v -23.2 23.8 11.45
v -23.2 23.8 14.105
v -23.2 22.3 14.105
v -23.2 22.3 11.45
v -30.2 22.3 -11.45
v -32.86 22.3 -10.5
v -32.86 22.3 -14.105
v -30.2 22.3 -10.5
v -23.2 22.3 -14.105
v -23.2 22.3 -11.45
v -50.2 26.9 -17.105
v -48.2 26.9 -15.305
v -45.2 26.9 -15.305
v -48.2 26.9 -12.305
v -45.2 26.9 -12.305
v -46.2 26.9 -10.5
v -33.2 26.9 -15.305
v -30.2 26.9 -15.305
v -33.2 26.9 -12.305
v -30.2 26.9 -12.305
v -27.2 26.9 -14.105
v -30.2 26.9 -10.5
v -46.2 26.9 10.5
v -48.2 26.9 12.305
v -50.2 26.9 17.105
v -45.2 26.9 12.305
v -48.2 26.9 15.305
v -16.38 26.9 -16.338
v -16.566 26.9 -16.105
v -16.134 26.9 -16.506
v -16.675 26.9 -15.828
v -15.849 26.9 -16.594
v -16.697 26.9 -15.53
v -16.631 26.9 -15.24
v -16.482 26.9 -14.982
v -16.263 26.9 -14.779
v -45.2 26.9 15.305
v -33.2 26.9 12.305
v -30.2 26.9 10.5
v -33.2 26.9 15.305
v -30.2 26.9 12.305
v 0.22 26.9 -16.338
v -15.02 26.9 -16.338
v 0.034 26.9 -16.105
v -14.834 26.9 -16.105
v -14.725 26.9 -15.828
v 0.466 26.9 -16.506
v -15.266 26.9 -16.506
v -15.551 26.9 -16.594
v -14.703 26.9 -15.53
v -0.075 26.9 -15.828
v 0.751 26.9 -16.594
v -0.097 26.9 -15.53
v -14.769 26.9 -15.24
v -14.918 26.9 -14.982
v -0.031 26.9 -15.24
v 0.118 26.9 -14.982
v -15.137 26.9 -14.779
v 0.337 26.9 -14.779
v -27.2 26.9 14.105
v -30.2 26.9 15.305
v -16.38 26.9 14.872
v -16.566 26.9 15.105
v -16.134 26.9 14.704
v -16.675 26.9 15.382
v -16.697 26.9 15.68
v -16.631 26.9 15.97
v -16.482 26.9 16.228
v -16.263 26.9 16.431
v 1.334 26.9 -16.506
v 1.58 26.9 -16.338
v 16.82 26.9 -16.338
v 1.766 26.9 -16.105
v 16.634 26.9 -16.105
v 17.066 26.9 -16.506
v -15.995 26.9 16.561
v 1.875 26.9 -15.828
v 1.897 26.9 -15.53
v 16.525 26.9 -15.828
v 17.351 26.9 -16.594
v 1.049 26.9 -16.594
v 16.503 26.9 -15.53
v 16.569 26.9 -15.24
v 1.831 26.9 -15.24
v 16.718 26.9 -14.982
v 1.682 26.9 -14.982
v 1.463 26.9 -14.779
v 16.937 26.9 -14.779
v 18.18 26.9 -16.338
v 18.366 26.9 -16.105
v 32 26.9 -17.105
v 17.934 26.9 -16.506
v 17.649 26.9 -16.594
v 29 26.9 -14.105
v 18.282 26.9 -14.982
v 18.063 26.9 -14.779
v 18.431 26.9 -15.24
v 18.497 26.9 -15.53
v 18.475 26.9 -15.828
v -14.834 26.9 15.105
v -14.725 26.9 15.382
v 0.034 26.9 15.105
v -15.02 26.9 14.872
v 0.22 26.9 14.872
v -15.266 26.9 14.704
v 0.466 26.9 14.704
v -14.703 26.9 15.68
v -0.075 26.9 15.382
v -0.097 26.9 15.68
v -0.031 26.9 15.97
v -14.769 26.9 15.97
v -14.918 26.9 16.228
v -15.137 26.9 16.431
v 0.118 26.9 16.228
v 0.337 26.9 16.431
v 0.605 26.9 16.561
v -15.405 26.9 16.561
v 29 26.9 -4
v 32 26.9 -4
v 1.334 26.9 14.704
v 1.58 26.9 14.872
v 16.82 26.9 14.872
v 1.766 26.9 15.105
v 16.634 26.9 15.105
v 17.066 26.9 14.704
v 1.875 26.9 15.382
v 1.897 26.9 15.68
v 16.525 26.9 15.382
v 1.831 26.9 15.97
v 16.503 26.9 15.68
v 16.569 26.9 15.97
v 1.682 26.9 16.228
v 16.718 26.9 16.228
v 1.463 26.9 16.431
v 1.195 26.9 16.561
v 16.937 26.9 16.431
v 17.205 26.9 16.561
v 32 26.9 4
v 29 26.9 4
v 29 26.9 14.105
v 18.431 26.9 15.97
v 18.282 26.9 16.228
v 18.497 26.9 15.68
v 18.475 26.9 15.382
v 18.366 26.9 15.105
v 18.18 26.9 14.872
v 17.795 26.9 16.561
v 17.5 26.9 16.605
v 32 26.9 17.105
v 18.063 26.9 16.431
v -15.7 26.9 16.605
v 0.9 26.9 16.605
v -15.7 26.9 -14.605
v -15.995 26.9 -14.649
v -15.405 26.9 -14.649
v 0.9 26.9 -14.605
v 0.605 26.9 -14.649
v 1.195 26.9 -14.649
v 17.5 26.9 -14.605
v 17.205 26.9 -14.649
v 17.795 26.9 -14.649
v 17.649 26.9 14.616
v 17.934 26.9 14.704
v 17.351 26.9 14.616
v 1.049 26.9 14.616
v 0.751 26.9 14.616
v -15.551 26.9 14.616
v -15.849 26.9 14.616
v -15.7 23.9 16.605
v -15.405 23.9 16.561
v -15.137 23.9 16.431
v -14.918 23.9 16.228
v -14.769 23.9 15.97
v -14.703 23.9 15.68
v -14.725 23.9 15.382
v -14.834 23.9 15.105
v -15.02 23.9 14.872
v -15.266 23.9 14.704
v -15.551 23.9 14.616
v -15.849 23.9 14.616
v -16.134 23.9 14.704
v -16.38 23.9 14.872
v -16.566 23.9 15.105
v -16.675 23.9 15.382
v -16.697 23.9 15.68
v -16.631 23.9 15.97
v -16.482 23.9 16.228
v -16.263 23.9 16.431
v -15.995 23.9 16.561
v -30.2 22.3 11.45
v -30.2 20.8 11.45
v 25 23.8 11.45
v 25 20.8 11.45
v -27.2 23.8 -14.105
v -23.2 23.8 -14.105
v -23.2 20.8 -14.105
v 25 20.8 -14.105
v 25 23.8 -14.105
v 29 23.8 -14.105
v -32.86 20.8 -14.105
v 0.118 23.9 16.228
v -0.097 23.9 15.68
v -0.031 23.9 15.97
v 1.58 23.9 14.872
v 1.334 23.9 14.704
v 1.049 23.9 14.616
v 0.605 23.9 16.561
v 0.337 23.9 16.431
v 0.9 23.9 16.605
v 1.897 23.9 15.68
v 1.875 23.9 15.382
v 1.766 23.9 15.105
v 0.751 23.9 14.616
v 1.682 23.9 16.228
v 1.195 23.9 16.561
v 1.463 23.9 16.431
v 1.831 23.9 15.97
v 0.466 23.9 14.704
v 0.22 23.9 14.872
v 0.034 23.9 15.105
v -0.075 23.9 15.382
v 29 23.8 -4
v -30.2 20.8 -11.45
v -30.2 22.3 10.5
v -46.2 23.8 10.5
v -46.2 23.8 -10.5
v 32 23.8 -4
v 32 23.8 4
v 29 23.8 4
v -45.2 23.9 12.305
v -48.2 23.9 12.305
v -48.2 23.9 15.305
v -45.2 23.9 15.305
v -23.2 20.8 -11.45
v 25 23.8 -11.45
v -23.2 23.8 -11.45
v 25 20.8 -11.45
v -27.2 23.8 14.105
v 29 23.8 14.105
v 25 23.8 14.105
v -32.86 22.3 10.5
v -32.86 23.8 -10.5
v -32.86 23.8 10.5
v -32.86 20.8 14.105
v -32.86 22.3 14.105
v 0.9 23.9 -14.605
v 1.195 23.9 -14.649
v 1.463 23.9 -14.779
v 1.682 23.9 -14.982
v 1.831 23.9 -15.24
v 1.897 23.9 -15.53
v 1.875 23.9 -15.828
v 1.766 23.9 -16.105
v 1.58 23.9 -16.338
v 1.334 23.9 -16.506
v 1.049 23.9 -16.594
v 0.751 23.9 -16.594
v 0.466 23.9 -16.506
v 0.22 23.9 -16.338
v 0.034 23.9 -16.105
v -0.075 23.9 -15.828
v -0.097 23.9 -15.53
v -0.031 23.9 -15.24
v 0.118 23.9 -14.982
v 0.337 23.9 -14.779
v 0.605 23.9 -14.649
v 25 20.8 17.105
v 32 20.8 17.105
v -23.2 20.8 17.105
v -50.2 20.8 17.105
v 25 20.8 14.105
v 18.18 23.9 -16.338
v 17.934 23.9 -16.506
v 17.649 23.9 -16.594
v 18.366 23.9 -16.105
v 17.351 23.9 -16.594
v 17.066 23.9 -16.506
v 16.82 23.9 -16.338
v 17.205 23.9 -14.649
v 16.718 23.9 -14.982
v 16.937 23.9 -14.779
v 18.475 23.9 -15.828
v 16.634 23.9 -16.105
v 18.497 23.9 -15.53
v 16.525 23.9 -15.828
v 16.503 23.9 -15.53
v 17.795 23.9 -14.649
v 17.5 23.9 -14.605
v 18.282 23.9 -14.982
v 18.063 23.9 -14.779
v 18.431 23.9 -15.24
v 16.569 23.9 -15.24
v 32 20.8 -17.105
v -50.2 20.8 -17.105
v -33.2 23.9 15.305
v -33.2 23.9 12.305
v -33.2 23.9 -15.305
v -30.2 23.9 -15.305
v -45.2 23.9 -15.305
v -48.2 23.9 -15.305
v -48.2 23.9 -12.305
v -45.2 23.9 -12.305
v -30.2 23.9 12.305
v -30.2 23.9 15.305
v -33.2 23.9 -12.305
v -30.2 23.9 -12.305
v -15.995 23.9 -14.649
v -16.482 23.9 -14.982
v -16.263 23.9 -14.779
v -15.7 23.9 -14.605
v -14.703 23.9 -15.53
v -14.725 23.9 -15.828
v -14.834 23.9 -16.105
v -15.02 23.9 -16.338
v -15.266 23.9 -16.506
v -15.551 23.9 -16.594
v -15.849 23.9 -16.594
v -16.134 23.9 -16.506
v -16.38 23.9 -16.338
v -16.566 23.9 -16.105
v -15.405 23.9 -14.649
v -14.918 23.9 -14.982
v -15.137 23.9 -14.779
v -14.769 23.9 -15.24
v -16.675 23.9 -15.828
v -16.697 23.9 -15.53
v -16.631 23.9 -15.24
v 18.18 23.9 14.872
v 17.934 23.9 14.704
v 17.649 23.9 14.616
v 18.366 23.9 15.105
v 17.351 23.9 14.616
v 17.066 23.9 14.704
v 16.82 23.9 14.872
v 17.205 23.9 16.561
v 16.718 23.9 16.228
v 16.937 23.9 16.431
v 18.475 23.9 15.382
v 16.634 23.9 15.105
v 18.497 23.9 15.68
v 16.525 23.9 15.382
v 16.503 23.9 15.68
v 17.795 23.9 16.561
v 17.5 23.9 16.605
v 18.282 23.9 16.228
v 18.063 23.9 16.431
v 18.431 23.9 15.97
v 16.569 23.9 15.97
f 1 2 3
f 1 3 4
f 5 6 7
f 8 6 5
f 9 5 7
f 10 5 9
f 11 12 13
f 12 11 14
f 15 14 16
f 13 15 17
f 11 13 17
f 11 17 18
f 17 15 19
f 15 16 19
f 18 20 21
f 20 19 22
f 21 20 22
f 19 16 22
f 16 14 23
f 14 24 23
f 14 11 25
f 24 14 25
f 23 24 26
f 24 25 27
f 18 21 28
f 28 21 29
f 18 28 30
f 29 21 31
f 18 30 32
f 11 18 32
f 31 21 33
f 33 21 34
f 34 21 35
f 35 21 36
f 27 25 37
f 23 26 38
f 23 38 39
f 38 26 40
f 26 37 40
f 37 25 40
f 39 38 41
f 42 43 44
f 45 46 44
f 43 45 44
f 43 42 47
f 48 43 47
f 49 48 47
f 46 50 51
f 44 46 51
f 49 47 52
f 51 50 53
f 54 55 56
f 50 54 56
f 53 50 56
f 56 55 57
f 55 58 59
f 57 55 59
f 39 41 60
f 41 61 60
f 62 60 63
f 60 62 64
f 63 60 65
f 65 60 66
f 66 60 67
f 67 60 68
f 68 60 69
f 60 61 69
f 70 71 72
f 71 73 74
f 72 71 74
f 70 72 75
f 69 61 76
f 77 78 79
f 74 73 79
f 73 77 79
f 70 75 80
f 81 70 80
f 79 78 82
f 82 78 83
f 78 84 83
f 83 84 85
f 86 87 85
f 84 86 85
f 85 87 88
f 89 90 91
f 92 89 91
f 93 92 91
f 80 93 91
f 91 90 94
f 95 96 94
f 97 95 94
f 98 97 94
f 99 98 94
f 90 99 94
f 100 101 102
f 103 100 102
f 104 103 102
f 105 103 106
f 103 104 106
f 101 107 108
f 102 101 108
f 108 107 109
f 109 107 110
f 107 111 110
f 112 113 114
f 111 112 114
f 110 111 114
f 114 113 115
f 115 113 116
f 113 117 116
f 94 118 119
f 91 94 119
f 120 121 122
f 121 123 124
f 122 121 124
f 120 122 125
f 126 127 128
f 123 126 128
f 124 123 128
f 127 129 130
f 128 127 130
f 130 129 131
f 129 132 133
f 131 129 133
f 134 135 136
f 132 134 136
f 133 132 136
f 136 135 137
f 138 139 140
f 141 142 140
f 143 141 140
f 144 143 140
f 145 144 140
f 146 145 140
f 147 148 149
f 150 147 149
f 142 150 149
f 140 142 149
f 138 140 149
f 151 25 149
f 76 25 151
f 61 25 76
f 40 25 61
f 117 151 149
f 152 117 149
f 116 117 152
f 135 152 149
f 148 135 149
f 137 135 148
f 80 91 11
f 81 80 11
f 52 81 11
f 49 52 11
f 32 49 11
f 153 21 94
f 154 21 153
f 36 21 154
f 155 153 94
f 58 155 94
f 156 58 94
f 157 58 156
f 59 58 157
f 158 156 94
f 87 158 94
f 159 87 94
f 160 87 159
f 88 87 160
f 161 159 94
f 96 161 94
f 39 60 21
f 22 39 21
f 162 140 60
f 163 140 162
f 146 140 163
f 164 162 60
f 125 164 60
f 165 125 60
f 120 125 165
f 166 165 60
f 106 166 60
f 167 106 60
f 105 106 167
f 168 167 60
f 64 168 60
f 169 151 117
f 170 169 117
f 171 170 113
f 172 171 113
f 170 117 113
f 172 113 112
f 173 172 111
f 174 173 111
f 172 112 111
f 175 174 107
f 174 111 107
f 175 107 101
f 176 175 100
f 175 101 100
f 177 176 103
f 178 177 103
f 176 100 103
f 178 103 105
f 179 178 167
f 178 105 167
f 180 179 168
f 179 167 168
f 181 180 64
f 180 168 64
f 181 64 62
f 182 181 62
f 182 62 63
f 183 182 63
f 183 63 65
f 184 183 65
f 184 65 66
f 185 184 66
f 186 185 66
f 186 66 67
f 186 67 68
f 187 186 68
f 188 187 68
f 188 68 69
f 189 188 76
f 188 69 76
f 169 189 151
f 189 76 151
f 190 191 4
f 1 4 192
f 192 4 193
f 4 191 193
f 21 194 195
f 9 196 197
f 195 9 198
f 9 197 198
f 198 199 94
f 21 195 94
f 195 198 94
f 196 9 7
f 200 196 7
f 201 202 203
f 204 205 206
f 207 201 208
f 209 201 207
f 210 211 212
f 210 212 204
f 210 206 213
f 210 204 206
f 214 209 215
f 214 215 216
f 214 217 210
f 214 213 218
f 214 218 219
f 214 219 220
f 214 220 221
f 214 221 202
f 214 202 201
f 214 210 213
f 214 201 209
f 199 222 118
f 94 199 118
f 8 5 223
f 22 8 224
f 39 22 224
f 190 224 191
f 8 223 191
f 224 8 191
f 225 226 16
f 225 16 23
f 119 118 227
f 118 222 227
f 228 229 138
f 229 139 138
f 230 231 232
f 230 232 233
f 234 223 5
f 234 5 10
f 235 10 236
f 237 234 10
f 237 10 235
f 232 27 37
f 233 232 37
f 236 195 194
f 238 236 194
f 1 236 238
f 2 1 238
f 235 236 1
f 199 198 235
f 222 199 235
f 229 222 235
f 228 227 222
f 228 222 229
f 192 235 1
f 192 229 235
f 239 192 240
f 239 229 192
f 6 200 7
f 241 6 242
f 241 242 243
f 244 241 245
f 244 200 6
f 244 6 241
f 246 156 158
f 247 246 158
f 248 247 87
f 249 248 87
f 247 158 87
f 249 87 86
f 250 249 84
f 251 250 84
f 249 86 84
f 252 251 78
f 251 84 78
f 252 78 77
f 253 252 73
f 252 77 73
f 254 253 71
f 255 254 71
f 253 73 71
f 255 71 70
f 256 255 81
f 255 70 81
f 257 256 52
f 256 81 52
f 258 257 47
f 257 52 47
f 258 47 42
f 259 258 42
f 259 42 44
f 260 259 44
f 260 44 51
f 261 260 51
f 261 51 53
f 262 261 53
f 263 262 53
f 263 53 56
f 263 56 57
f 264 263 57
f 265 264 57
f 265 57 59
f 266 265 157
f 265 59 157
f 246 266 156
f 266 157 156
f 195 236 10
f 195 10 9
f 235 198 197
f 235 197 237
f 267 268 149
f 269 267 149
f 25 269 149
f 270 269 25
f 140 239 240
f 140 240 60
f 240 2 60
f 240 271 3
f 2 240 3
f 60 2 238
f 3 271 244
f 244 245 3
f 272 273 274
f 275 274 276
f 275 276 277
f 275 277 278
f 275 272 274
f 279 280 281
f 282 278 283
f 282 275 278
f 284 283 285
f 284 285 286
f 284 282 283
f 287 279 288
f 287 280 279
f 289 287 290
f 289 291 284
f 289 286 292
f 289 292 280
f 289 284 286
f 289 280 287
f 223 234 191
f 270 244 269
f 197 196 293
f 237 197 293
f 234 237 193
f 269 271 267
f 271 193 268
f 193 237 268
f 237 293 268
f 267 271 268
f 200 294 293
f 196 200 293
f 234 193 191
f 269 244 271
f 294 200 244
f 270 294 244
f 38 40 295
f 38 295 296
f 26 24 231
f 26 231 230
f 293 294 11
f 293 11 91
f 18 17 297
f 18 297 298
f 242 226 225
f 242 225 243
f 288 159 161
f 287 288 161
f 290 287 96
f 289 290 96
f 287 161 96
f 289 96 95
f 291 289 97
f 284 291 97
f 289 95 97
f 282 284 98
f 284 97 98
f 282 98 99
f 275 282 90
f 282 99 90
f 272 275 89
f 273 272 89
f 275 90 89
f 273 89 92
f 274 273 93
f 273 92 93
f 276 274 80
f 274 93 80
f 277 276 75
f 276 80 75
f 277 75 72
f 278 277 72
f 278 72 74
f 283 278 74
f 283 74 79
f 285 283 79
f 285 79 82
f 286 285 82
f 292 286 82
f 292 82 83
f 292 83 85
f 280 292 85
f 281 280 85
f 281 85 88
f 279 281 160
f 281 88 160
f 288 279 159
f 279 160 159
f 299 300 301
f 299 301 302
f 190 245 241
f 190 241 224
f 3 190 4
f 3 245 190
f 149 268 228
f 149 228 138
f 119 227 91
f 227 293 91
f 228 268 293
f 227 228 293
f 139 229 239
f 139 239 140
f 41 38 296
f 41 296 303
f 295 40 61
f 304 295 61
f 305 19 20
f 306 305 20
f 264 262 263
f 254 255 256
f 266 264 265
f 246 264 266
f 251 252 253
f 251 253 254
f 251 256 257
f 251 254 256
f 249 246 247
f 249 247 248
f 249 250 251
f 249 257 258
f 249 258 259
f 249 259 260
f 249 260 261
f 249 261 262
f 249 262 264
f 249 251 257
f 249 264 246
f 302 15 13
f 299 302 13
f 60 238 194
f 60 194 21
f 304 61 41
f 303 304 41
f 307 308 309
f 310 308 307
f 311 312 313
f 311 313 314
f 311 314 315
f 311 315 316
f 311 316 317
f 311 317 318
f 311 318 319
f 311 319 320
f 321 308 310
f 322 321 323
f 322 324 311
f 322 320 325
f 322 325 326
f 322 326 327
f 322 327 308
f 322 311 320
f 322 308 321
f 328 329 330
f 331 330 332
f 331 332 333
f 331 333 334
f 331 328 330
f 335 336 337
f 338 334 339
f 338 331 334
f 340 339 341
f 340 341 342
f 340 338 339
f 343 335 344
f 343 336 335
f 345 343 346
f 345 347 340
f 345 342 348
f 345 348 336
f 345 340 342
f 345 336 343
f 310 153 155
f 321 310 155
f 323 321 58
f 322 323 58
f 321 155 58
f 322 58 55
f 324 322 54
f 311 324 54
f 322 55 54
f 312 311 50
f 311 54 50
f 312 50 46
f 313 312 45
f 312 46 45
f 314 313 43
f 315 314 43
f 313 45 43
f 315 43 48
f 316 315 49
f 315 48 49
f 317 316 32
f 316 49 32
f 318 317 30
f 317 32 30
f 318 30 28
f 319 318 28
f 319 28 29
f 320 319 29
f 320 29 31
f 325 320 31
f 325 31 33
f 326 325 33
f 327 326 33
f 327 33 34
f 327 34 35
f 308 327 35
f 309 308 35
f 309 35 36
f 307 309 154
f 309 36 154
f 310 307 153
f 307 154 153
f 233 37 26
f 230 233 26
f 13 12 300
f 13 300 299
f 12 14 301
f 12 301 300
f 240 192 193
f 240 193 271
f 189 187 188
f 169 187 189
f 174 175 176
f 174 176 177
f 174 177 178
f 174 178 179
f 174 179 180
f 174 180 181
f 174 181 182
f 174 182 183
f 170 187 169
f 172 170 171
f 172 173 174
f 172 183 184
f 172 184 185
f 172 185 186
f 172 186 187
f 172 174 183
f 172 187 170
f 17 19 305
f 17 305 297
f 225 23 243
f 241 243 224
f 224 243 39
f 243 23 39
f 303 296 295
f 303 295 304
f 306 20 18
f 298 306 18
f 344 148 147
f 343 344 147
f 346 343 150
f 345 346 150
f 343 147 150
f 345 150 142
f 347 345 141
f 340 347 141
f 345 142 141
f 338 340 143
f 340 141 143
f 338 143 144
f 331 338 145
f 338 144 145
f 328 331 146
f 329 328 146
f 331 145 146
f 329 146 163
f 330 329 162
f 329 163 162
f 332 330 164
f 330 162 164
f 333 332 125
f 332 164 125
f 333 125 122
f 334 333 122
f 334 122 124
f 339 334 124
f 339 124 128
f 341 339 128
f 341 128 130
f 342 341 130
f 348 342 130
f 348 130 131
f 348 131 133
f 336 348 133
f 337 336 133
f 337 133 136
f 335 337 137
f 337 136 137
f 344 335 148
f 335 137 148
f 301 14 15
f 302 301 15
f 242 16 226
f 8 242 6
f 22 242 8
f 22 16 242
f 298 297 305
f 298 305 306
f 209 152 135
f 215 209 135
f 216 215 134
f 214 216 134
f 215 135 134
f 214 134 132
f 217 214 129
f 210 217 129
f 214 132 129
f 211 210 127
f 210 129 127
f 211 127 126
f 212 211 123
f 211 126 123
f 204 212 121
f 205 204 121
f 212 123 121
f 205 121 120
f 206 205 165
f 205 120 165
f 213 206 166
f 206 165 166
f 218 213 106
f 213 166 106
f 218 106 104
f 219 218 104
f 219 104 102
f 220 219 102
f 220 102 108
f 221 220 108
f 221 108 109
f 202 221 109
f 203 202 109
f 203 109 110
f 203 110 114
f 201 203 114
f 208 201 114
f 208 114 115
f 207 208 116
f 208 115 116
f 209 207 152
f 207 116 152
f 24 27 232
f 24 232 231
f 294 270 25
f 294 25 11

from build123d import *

# Parameters (mm, degrees)
SKETCH1_W            = 46.4
SKETCH1_H            = 24.75
BOSS_EXTRUDE1_DEPTH  = 5.9
BOSS_EXTRUDE2_DEPTH  = 2.5
SKETCH3_W            = 50
SKETCH3_H            = 50
BOSS_EXTRUDE3_DEPTH  = 2.5
SKETCH4_W            = 46.4
SKETCH4_H            = 0.93
BOSS_EXTRUDE4_DEPTH  = 5.9
SKETCH5_W            = 46.4
SKETCH5_H            = 0.93
BOSS_EXTRUDE5_DEPTH  = 5.9
SKETCH6_W            = 46.4
SKETCH6_H            = 3
BOSS_EXTRUDE6_DEPTH  = 8.4
SKETCH7_W            = 46.4
SKETCH7_H            = 3
BOSS_EXTRUDE7_DEPTH  = 8.4
SKETCH8_W            = 46.4
SKETCH8_H            = 22.9
BOSS_EXTRUDE8_DEPTH  = 8.4
SKETCH9_W            = 46.4
SKETCH9_H            = 3
BOSS_EXTRUDE9_DEPTH  = 8.4
SKETCH10_W           = 22.9
SKETCH10_H           = 10.9
BOSS_EXTRUDE10_DEPTH = 1.8
SKETCH11_W           = 0.93
SKETCH11_H           = 5.9
BOSS_EXTRUDE11_DEPTH = 1.8
SKETCH12_W           = 32.7
SKETCH12_H           = 0.925
SKETCH12_H_2         = 0.93
BOSS_EXTRUDE12_DEPTH = 8.4
SKETCH13_W           = 0.93
SKETCH13_H           = 5.9
BOSS_EXTRUDE13_DEPTH = 1.8
SKETCH14_W           = 48.2
SKETCH14_H           = 3
BOSS_EXTRUDE14_DEPTH = 8.4
SKETCH15_W           = 32.7
SKETCH15_H           = 0.93
SKETCH15_H_2         = 0.925
BOSS_EXTRUDE15_DEPTH = 8.4
SKETCH16_W           = 0.35
SKETCH16_H           = 5.9
CUT_EXTRUDE1_DEPTH   = 59.371568422
SKETCH18_W           = 0.35
SKETCH18_H           = 5.9
CUT_EXTRUDE2_DEPTH   = 59.371568422
SKETCH20_W           = 22.9
SKETCH20_H           = 2.5
BOSS_EXTRUDE17_DEPTH = 4
SKETCH22_W           = 22.9
SKETCH22_H           = 2.5
BOSS_EXTRUDE19_DEPTH = 3
SKETCH23_W           = 3
SKETCH23_H           = 22.9
BOSS_EXTRUDE20_DEPTH = 1.5
SKETCH24_W           = 22.9
SKETCH24_H           = 2.5
BOSS_EXTRUDE21_DEPTH = 7
SKETCH25_W           = 3
SKETCH25_H           = 22.9
BOSS_EXTRUDE22_DEPTH = 3
SKETCH27_W           = 48.2
SKETCH27_H           = 3
BOSS_EXTRUDE23_DEPTH = 7
SKETCH28_W           = 56.2
SKETCH28_H           = 22.9
BOSS_EXTRUDE24_DEPTH = 7
SKETCH29_W           = 3
SKETCH29_H           = 22.9
BOSS_EXTRUDE25_DEPTH = 7
SKETCH30_W           = 3
SKETCH30_H           = 22.9
BOSS_EXTRUDE26_DEPTH = 7
SKETCH31_W           = 7
SKETCH31_H           = 6.5
CUT_EXTRUDE3_DEPTH   = 56.415182938
SKETCH32_W           = 7
SKETCH32_H           = 6.5
CUT_EXTRUDE4_DEPTH   = 56.415182938
SKETCH33_W           = 2.66
SKETCH33_H           = 2.66
CUT_EXTRUDE5_DEPTH   = 67.259188042
SKETCH34_W           = 2.66
SKETCH34_H           = 2.66
CUT_EXTRUDE6_DEPTH   = 67.259188042
SKETCH35_W           = 3
SKETCH35_H           = 8
CUT_EXTRUDE7_DEPTH   = 3
SKETCH36_W           = 3
SKETCH36_H           = 22.9
BOSS_EXTRUDE27_DEPTH = 1.5
SKETCH38_W           = 48.2
SKETCH38_H           = 3
BOSS_EXTRUDE28_DEPTH = 3.1
SKETCH39_W           = 48.2
SKETCH39_H           = 3
BOSS_EXTRUDE29_DEPTH = 3.1
SKETCH40_W           = 3
SKETCH40_H           = 7.45
BOSS_EXTRUDE30_DEPTH = 0.1
SKETCH41_W           = 3
SKETCH41_H           = 22.9
BOSS_EXTRUDE31_DEPTH = 0.1
SKETCH43_W           = 3
SKETCH43_H           = 6.1
BOSS_EXTRUDE32_DEPTH = 5.655
SKETCH44_W           = 3
SKETCH44_H           = 6.1
BOSS_EXTRUDE33_DEPTH = 4
SKETCH45_W           = 3
SKETCH45_H           = 6.1
BOSS_EXTRUDE34_DEPTH = 5.655
SKETCH46_W           = 3
SKETCH46_H           = 6.1
BOSS_EXTRUDE35_DEPTH = 4
SKETCH47_W           = 3
SKETCH47_H           = 6.1
BOSS_EXTRUDE36_DEPTH = 5.655
SKETCH48_W           = 3
SKETCH48_H           = 6.1
BOSS_EXTRUDE37_DEPTH = 4
SKETCH49_W           = 3
SKETCH49_H           = 6.1
BOSS_EXTRUDE38_DEPTH = 5.655
SKETCH50_W           = 3
SKETCH50_H           = 6.1
BOSS_EXTRUDE39_DEPTH = 4
SKETCH51_W           = 34.21
SKETCH51_H           = 30.544600681
CUT_EXTRUDE9_DEPTH   = 67.29969834
SKETCH52_W           = 63.173752843
SKETCH52_H           = 8.017793163
CUT_EXTRUDE10_DEPTH  = 67.29969834
BOSS_EXTRUDE40_DEPTH = 6.1
SKETCH55_W           = 16
SKETCH55_H           = 21
BOSS_EXTRUDE41_DEPTH = 3
SKETCH56_W           = 2.66
SKETCH56_H           = 21
CUT_EXTRUDE11_DEPTH  = 54.124674352
SKETCH59_W           = 2.655
SKETCH59_H           = 3
BOSS_EXTRUDE44_DEPTH = 4
SKETCH60_W           = 2.655
SKETCH60_H           = 3
BOSS_EXTRUDE45_DEPTH = 4
SKETCH61_W           = 2.655
SKETCH61_H           = 3
BOSS_EXTRUDE46_DEPTH = 4
SKETCH62_W           = 2.655
SKETCH62_H           = 3
BOSS_EXTRUDE47_DEPTH = 4
SKETCH64_W           = 3
SKETCH64_H           = 3
CUT_EXTRUDE12_DEPTH  = 3
SKETCH42_R           = 1
CUT_EXTRUDE13_DEPTH  = 3
SKETCH65_W           = 2.66
SKETCH65_H           = 3.605
SKETCH65_W_2         = 7
SKETCH65_H_2         = 2.655
CUT_EXTRUDE14_DEPTH  = 1.5


with BuildPart() as part:
    # Sketch1 → Boss-Extrude1 (new body)
    with BuildSketch(Plane(origin=(0, 0, 0), x_dir=(1, 0, 0), z_dir=(0, 1, 0))):
        Rectangle(SKETCH1_W, SKETCH1_H)
    extrude(amount=BOSS_EXTRUDE1_DEPTH)

    # Sketch2 → Boss-Extrude2 (add)
    with BuildSketch(Plane(origin=(0, 5.9, 0), x_dir=(1, 0, 0), z_dir=(0, 1, 0))):
        Polygon((23.2, -11.45), (23.2, 0), (23.2, 11.45), (-23.2, 11.45), (-23.2, -11.45), align=None)
    extrude(amount=BOSS_EXTRUDE2_DEPTH)

    # Sketch3 → Boss-Extrude3 (add)
    with BuildSketch(Plane.XZ):
        Rectangle(SKETCH3_W, SKETCH3_H)
    extrude(amount=BOSS_EXTRUDE3_DEPTH)

    # Sketch4 → Boss-Extrude4 (add)
    with BuildSketch(Plane(origin=(0, 0, 0), x_dir=(1, 0, 0), z_dir=(0, 1, 0))):
        with Locations((0, 13.64)):
            Rectangle(SKETCH4_W, SKETCH4_H)
    extrude(amount=BOSS_EXTRUDE4_DEPTH)

    # Sketch5 → Boss-Extrude5 (add)
    with BuildSketch(Plane(origin=(0, 0, 0), x_dir=(1, 0, 0), z_dir=(0, 1, 0))):
        with Locations((0, -13.64)):
            Rectangle(SKETCH5_W, SKETCH5_H)
    extrude(amount=BOSS_EXTRUDE5_DEPTH)

    # Sketch6 → Boss-Extrude6 (add)
    with BuildSketch(Plane(origin=(0, 0, 0), x_dir=(1, 0, 0), z_dir=(0, 1, 0))):
        with Locations((0, 15.605)):
            Rectangle(SKETCH6_W, SKETCH6_H)
    extrude(amount=BOSS_EXTRUDE6_DEPTH)

    # Sketch7 → Boss-Extrude7 (add)
    with BuildSketch(Plane(origin=(0, 0, 0), x_dir=(1, 0, 0), z_dir=(0, 1, 0))):
        with Locations((0, -15.605)):
            Rectangle(SKETCH7_W, SKETCH7_H)
    extrude(amount=BOSS_EXTRUDE7_DEPTH)

    # Sketch8 → Boss-Extrude8 (add)
    with BuildSketch(Plane(origin=(0, 8.4, 0), x_dir=(1, 0, 0), z_dir=(0, 1, 0))):
        Rectangle(SKETCH8_W, SKETCH8_H)
    extrude(amount=BOSS_EXTRUDE8_DEPTH)

    # Sketch9 → Boss-Extrude9 (add)
    with BuildSketch(Plane(origin=(0, 8.4, 0), x_dir=(1, 0, 0), z_dir=(0, 1, 0))):
        with Locations((0, -15.605)):
            Rectangle(SKETCH9_W, SKETCH9_H)
    extrude(amount=BOSS_EXTRUDE9_DEPTH)

    # Sketch10 → Boss-Extrude10 (add)
    with BuildSketch(Plane(origin=(23.2, 0, 0), x_dir=(0, 0, -1), z_dir=(1, 0, 0))):
        with Locations((0, 11.35)):
            Rectangle(SKETCH10_W, SKETCH10_H)
        Polygon((-11.45, 5.9), (11.45, 5.9), (12.375, 5.9), (12.375, 0), (-12.375, 0), (-12.375, 5.9), align=None)
    extrude(amount=BOSS_EXTRUDE10_DEPTH)

    # Sketch11 → Boss-Extrude11 (add)
    with BuildSketch(Plane(origin=(23.2, 0, 0), x_dir=(0, 0, -1), z_dir=(1, 0, 0))):
        Polygon((-14.105, 16.8), (-17.105, 16.8), (-17.105, 0), (-14.105, 0), (-14.105, 5.9), align=None)
        with Locations((-13.64, 2.95)):
            Rectangle(SKETCH11_W, SKETCH11_H)
    extrude(amount=BOSS_EXTRUDE11_DEPTH)

    # Sketch12 → Boss-Extrude12 (add)
    with BuildSketch(Plane(origin=(0, 5.9, 0), x_dir=(1, 0, 0), z_dir=(0, 1, 0))):
        with Locations((-6.85, -11.9125)):
            Rectangle(SKETCH12_W, SKETCH12_H)
        with Locations((-6.85, -13.64)):
            Rectangle(SKETCH12_W, SKETCH12_H_2)
    extrude(amount=BOSS_EXTRUDE12_DEPTH)

    # Sketch13 → Boss-Extrude13 (add)
    with BuildSketch(Plane(origin=(23.2, 0, 0), x_dir=(0, 0, -1), z_dir=(1, 0, 0))):
        Polygon((17.105, 0), (17.105, 8.4), (14.105, 8.4), (14.105, 5.9), (14.105, 0), align=None)
        with Locations((13.64, 2.95)):
            Rectangle(SKETCH13_W, SKETCH13_H)
    extrude(amount=BOSS_EXTRUDE13_DEPTH)

    # Sketch14 → Boss-Extrude14 (add)
    with BuildSketch(Plane(origin=(0, 8.4, 0), x_dir=(1, 0, 0), z_dir=(0, 1, 0))):
        with Locations((0.9, 15.605)):
            Rectangle(SKETCH14_W, SKETCH14_H)
    extrude(amount=BOSS_EXTRUDE14_DEPTH)

    # Sketch15 → Boss-Extrude15 (add)
    with BuildSketch(Plane(origin=(0, 5.9, 0), x_dir=(1, 0, 0), z_dir=(0, 1, 0))):
        with Locations((8.65, 13.64)):
            Rectangle(SKETCH15_W, SKETCH15_H)
        with Locations((8.65, 11.9125)):
            Rectangle(SKETCH15_W, SKETCH15_H_2)
    extrude(amount=BOSS_EXTRUDE15_DEPTH)

    # Sketch16 → Cut-Extrude1 (cut, through all)
    with BuildSketch(Plane(origin=(25, 0, 0), x_dir=(0, 0, -1), z_dir=(1, 0, 0))):
        with Locations((-12.2, 2.95)):
            Rectangle(SKETCH16_W, SKETCH16_H)
        with Locations((-13.35, 2.95)):
            Rectangle(SKETCH16_W, SKETCH16_H)
    extrude(amount=-CUT_EXTRUDE1_DEPTH, mode=Mode.SUBTRACT)

    # Sketch18 → Cut-Extrude2 (cut, through all)
    with BuildSketch(Plane(origin=(25, 0, 0), x_dir=(0, 0, -1), z_dir=(1, 0, 0))):
        with Locations((12.2, 2.95)):
            Rectangle(SKETCH18_W, SKETCH18_H)
        with Locations((13.35, 2.95)):
            Rectangle(SKETCH18_W, SKETCH18_H)
    extrude(amount=-CUT_EXTRUDE2_DEPTH, mode=Mode.SUBTRACT)

    # Sketch20 → Boss-Extrude17 (add)
    with BuildSketch(Plane.ZY.offset(23.2)):
        with Locations((0, 15.55)):
            Rectangle(SKETCH20_W, SKETCH20_H)
    extrude(amount=BOSS_EXTRUDE17_DEPTH)

    # Sketch22 → Boss-Extrude19 (add)
    with BuildSketch(Plane.ZY.offset(27.2)):
        with Locations((0, 15.55)):
            Rectangle(SKETCH22_W, SKETCH22_H)
    extrude(amount=BOSS_EXTRUDE19_DEPTH)

    # Sketch23 → Boss-Extrude20 (add)
    with BuildSketch(Plane(origin=(0, 16.8, 0), x_dir=(1, 0, 0), z_dir=(0, 1, 0))):
        with Locations((-28.7, 0)):
            Rectangle(SKETCH23_W, SKETCH23_H)
    extrude(amount=BOSS_EXTRUDE20_DEPTH)

    # Sketch24 → Boss-Extrude21 (add)
    with BuildSketch(Plane(origin=(25, 0, 0), x_dir=(0, 0, -1), z_dir=(1, 0, 0))):
        with Locations((0, 15.55)):
            Rectangle(SKETCH24_W, SKETCH24_H)
    extrude(amount=BOSS_EXTRUDE21_DEPTH)

    # Sketch25 → Boss-Extrude22 (add)
    with BuildSketch(Plane(origin=(0, 16.8, 0), x_dir=(1, 0, 0), z_dir=(0, 1, 0))):
        with Locations((30.5, 0)):
            Rectangle(SKETCH25_W, SKETCH25_H)
    extrude(amount=BOSS_EXTRUDE22_DEPTH)

    # Sketch27 → Boss-Extrude23 (add)
    with BuildSketch(Plane(origin=(0, 16.8, 0), x_dir=(1, 0, 0), z_dir=(0, 1, 0))):
        with Locations((0.9, 15.605)):
            Rectangle(SKETCH27_W, SKETCH27_H)
        with Locations((0.9, -15.605)):
            Rectangle(SKETCH27_W, SKETCH27_H)
    extrude(amount=BOSS_EXTRUDE23_DEPTH)

    # Sketch28 → Boss-Extrude24 (add)
    with BuildSketch(Plane(origin=(0, 16.8, 0), x_dir=(1, 0, 0), z_dir=(0, 1, 0))):
        with Locations((0.9, 0)):
            Rectangle(SKETCH28_W, SKETCH28_H)
    extrude(amount=BOSS_EXTRUDE24_DEPTH)

    # Sketch29 → Boss-Extrude25 (add)
    with BuildSketch(Plane(origin=(0, 18.3, 0), x_dir=(1, 0, 0), z_dir=(0, 1, 0))):
        with Locations((-28.7, 0)):
            Rectangle(SKETCH29_W, SKETCH29_H)
    extrude(amount=BOSS_EXTRUDE25_DEPTH)

    # Sketch30 → Boss-Extrude26 (add)
    with BuildSketch(Plane(origin=(0, 19.8, 0), x_dir=(1, 0, 0), z_dir=(0, 1, 0))):
        with Locations((30.5, 0)):
            Rectangle(SKETCH30_W, SKETCH30_H)
    extrude(amount=BOSS_EXTRUDE26_DEPTH)

    # Sketch31 → Cut-Extrude3 (cut, through all)
    with BuildSketch(Plane(origin=(0, 0, -11.45), x_dir=(-1, 0, 0), z_dir=(0, 0, -1))):
        with Locations((26.7, 17.55)):
            Rectangle(SKETCH31_W, SKETCH31_H)
    extrude(amount=-CUT_EXTRUDE3_DEPTH, mode=Mode.SUBTRACT)

    # Sketch32 → Cut-Extrude4 (cut, through all)
    with BuildSketch(Plane.XY.offset(11.45)):
        with Locations((28.5, 17.55)):
            Rectangle(SKETCH32_W, SKETCH32_H)
    extrude(amount=-CUT_EXTRUDE4_DEPTH, mode=Mode.SUBTRACT)

    # Sketch33 → Cut-Extrude5 (cut, through all)
    with BuildSketch(Plane.ZY.offset(23.2)):
        with Locations((-12.775, 1.33)):
            Rectangle(SKETCH33_W, SKETCH33_H)
    extrude(amount=-CUT_EXTRUDE5_DEPTH, mode=Mode.SUBTRACT)

    # Sketch34 → Cut-Extrude6 (cut, through all)
    with BuildSketch(Plane.ZY.offset(23.2)):
        with Locations((12.775, 1.33)):
            Rectangle(SKETCH34_W, SKETCH34_H)
    extrude(amount=-CUT_EXTRUDE6_DEPTH, mode=Mode.SUBTRACT)

    # Sketch35 → Cut-Extrude7 (cut)
    with BuildSketch(Plane(origin=(0, 26.8, 0), x_dir=(1, 0, 0), z_dir=(0, 1, 0))):
        with Locations((30.5, 0)):
            Rectangle(SKETCH35_W, SKETCH35_H)
    extrude(amount=-CUT_EXTRUDE7_DEPTH, mode=Mode.SUBTRACT)

    # Sketch36 → Boss-Extrude27 (add)
    with BuildSketch(Plane(origin=(0, 25.3, 0), x_dir=(1, 0, 0), z_dir=(0, 1, 0))):
        with Locations((-28.7, 0)):
            Rectangle(SKETCH36_W, SKETCH36_H)
    extrude(amount=BOSS_EXTRUDE27_DEPTH)

    # Sketch38 → Boss-Extrude28 (add)
    with BuildSketch(Plane(origin=(0, 23.8, 0), x_dir=(1, 0, 0), z_dir=(0, 1, 0))):
        with Locations((0.9, -15.605)):
            Rectangle(SKETCH38_W, SKETCH38_H)
    extrude(amount=BOSS_EXTRUDE28_DEPTH)

    # Sketch39 → Boss-Extrude29 (add)
    with BuildSketch(Plane(origin=(0, 23.8, 0), x_dir=(1, 0, 0), z_dir=(0, 1, 0))):
        with Locations((0.9, 15.605)):
            Rectangle(SKETCH39_W, SKETCH39_H)
    extrude(amount=BOSS_EXTRUDE29_DEPTH)

    # Sketch40 → Boss-Extrude30 (add)
    with BuildSketch(Plane(origin=(0, 26.8, 0), x_dir=(1, 0, 0), z_dir=(0, 1, 0))):
        with Locations((30.5, 7.725)):
            Rectangle(SKETCH40_W, SKETCH40_H)
        with Locations((30.5, -7.725)):
            Rectangle(SKETCH40_W, SKETCH40_H)
    extrude(amount=BOSS_EXTRUDE30_DEPTH)

    # Sketch41 → Boss-Extrude31 (add)
    with BuildSketch(Plane(origin=(0, 26.8, 0), x_dir=(1, 0, 0), z_dir=(0, 1, 0))):
        with Locations((-28.7, 0)):
            Rectangle(SKETCH41_W, SKETCH41_H)
    extrude(amount=BOSS_EXTRUDE31_DEPTH)

    # Sketch43 → Boss-Extrude32 (add)
    with BuildSketch(Plane.XY.offset(11.45)):
        with Locations((-28.7, 23.85)):
            Rectangle(SKETCH43_W, SKETCH43_H)
    extrude(amount=BOSS_EXTRUDE32_DEPTH)

    # Sketch44 → Boss-Extrude33 (add)
    with BuildSketch(Plane(origin=(-27.2, 0, 0), x_dir=(0, 0, -1), z_dir=(1, 0, 0))):
        with Locations((-15.605, 23.85)):
            Rectangle(SKETCH44_W, SKETCH44_H)
    extrude(amount=BOSS_EXTRUDE33_DEPTH)

    # Sketch45 → Boss-Extrude34 (add)
    with BuildSketch(Plane(origin=(0, 0, -11.45), x_dir=(-1, 0, 0), z_dir=(0, 0, -1))):
        with Locations((28.7, 23.85)):
            Rectangle(SKETCH45_W, SKETCH45_H)
    extrude(amount=BOSS_EXTRUDE34_DEPTH)

    # Sketch46 → Boss-Extrude35 (add)
    with BuildSketch(Plane(origin=(-27.2, 0, 0), x_dir=(0, 0, -1), z_dir=(1, 0, 0))):
        with Locations((15.605, 23.85)):
            Rectangle(SKETCH46_W, SKETCH46_H)
    extrude(amount=BOSS_EXTRUDE35_DEPTH)

    # Sketch47 → Boss-Extrude36 (add)
    with BuildSketch(Plane(origin=(0, 0, -11.45), x_dir=(-1, 0, 0), z_dir=(0, 0, -1))):
        with Locations((-30.5, 23.85)):
            Rectangle(SKETCH47_W, SKETCH47_H)
    extrude(amount=BOSS_EXTRUDE36_DEPTH)

    # Sketch48 → Boss-Extrude37 (add)
    with BuildSketch(Plane.ZY.offset(-29)):
        with Locations((-15.605, 23.85)):
            Rectangle(SKETCH48_W, SKETCH48_H)
    extrude(amount=BOSS_EXTRUDE37_DEPTH)

    # Sketch49 → Boss-Extrude38 (add)
    with BuildSketch(Plane.XY.offset(11.45)):
        with Locations((30.5, 23.85)):
            Rectangle(SKETCH49_W, SKETCH49_H)
    extrude(amount=BOSS_EXTRUDE38_DEPTH)

    # Sketch50 → Boss-Extrude39 (add)
    with BuildSketch(Plane.ZY.offset(-29)):
        with Locations((15.605, 23.85)):
            Rectangle(SKETCH50_W, SKETCH50_H)
    extrude(amount=BOSS_EXTRUDE39_DEPTH)

    # Sketch51 → Cut-Extrude9 (cut, through all)
    with BuildSketch(Plane.ZY.offset(23.2)):
        with Locations((0, 5.527699659)):
            Rectangle(SKETCH51_W, SKETCH51_H)
    extrude(amount=-CUT_EXTRUDE9_DEPTH, mode=Mode.SUBTRACT)


with BuildPart() as cut_extrude9_piece_1:
    # of the separate pieces the step leaves, piece 1, a body of its own (cut_extrude9_pieces)
    add(part.part.solids().sort_by_distance((32, 20.8, 17.105))[0])

    # Sketch54 → Boss-Extrude40 (add)
    with BuildSketch(Plane.XZ.offset(-20.8)):
        Polygon((-46.2, 10.5), (-30.2, 10.5), (-30.2, 17.105), (-50.2, 17.105), (-50.2, -17.105), (-30.2, -17.105), (-30.2, -10.5), (-46.2, -10.5), align=None)
    extrude(amount=-BOSS_EXTRUDE40_DEPTH)

    # Sketch55 → Boss-Extrude41 (add)
    with BuildSketch(Plane.XZ.offset(-20.8)):
        with Locations((-38.2, 0)):
            Rectangle(SKETCH55_W, SKETCH55_H)
    extrude(amount=-BOSS_EXTRUDE41_DEPTH)

    # Sketch56 → Cut-Extrude11 (cut, through all)
    with BuildSketch(Plane(origin=(0, 23.8, 0), x_dir=(1, 0, 0), z_dir=(0, 1, 0))):
        with Locations((-31.53, 0)):
            Rectangle(SKETCH56_W, SKETCH56_H)
    extrude(amount=-CUT_EXTRUDE11_DEPTH, mode=Mode.SUBTRACT)

    # Sketch59 → Boss-Extrude44 (add)
    with BuildSketch(Plane(origin=(-27.2, 0, 0), x_dir=(0, 0, -1), z_dir=(1, 0, 0))):
        with Locations((12.7775, 22.3)):
            Rectangle(SKETCH59_W, SKETCH59_H)
    extrude(amount=BOSS_EXTRUDE44_DEPTH)

    # Sketch60 → Boss-Extrude45 (add)
    with BuildSketch(Plane(origin=(-27.2, 0, 0), x_dir=(0, 0, -1), z_dir=(1, 0, 0))):
        with Locations((-12.7775, 22.3)):
            Rectangle(SKETCH60_W, SKETCH60_H)
    extrude(amount=BOSS_EXTRUDE45_DEPTH)

    # Sketch61 → Boss-Extrude46 (add)
    with BuildSketch(Plane.ZY.offset(-29)):
        with Locations((-12.7775, 22.3)):
            Rectangle(SKETCH61_W, SKETCH61_H)
    extrude(amount=BOSS_EXTRUDE46_DEPTH)

    # Sketch62 → Boss-Extrude47 (add)
    with BuildSketch(Plane.ZY.offset(-29)):
        with Locations((12.7775, 22.3)):
            Rectangle(SKETCH62_W, SKETCH62_H)
    extrude(amount=BOSS_EXTRUDE47_DEPTH)

    # Sketch64 → Cut-Extrude12 (cut)
    with BuildSketch(Plane(origin=(0, 26.9, 0), x_dir=(1, 0, 0), z_dir=(0, 1, 0))):
        with Locations((-46.7, 13.805)):
            Rectangle(SKETCH64_W, SKETCH64_H)
        with Locations((-46.7, -13.805)):
            Rectangle(SKETCH64_W, SKETCH64_H)
        with Locations((-31.7, 13.805)):
            Rectangle(SKETCH64_W, SKETCH64_H)
        with Locations((-31.7, -13.805)):
            Rectangle(SKETCH64_W, SKETCH64_H)
    extrude(amount=-CUT_EXTRUDE12_DEPTH, mode=Mode.SUBTRACT)

    # Sketch42 → Cut-Extrude13 (cut)
    with BuildSketch(Plane(origin=(0, 26.9, 0), x_dir=(1, 0, 0), z_dir=(0, 1, 0))):
        with Locations(Location((-15.7, -15.605, 0), (0, 0, 270))):
            Circle(SKETCH42_R)
        with Locations(Location((-15.7, 15.605, 0), (0, 0, 270))):
            Circle(SKETCH42_R)
        with Locations(Location((17.5, -15.605, 0), (0, 0, 270))):
            Circle(SKETCH42_R)
        with Locations(Location((17.5, 15.605, 0), (0, 0, 270))):
            Circle(SKETCH42_R)
        with Locations(Location((0.9, -15.605, 0), (0, 0, 270))):
            Circle(SKETCH42_R)
        with Locations(Location((0.9, 15.605, 0), (0, 0, 270))):
            Circle(SKETCH42_R)
    extrude(amount=-CUT_EXTRUDE13_DEPTH, mode=Mode.SUBTRACT)

    # Sketch65 → Cut-Extrude14 (cut)
    with BuildSketch(Plane.XZ.offset(-20.8)):
        with Locations((-31.53, 12.3025)):
            Rectangle(SKETCH65_W, SKETCH65_H)
        with Locations((-26.7, 12.7775)):
            Rectangle(SKETCH65_W_2, SKETCH65_H_2)
        with Locations((-31.53, -12.3025)):
            Rectangle(SKETCH65_W, SKETCH65_H)
        with Locations((-26.7, -12.7775)):
            Rectangle(SKETCH65_W_2, SKETCH65_H_2)
    extrude(amount=-CUT_EXTRUDE14_DEPTH, mode=Mode.SUBTRACT)


with BuildPart() as cut_extrude9_piece_2:
    # of the separate pieces the step leaves, piece 2, a body of its own (cut_extrude9_pieces)
    add(part.part.solids().sort_by_distance((-25, 0, 25))[0])

    # Sketch52 → Cut-Extrude10 (cut, through all)
    with BuildSketch(Plane(origin=(25, 0, 0), x_dir=(0, 0, -1), z_dir=(1, 0, 0))):
        with Locations((0.957814421, 0.092594216)):
            Rectangle(SKETCH52_W, SKETCH52_H)
    extrude(amount=-CUT_EXTRUDE10_DEPTH, mode=Mode.SUBTRACT)


solid = cut_extrude9_piece_1.part
